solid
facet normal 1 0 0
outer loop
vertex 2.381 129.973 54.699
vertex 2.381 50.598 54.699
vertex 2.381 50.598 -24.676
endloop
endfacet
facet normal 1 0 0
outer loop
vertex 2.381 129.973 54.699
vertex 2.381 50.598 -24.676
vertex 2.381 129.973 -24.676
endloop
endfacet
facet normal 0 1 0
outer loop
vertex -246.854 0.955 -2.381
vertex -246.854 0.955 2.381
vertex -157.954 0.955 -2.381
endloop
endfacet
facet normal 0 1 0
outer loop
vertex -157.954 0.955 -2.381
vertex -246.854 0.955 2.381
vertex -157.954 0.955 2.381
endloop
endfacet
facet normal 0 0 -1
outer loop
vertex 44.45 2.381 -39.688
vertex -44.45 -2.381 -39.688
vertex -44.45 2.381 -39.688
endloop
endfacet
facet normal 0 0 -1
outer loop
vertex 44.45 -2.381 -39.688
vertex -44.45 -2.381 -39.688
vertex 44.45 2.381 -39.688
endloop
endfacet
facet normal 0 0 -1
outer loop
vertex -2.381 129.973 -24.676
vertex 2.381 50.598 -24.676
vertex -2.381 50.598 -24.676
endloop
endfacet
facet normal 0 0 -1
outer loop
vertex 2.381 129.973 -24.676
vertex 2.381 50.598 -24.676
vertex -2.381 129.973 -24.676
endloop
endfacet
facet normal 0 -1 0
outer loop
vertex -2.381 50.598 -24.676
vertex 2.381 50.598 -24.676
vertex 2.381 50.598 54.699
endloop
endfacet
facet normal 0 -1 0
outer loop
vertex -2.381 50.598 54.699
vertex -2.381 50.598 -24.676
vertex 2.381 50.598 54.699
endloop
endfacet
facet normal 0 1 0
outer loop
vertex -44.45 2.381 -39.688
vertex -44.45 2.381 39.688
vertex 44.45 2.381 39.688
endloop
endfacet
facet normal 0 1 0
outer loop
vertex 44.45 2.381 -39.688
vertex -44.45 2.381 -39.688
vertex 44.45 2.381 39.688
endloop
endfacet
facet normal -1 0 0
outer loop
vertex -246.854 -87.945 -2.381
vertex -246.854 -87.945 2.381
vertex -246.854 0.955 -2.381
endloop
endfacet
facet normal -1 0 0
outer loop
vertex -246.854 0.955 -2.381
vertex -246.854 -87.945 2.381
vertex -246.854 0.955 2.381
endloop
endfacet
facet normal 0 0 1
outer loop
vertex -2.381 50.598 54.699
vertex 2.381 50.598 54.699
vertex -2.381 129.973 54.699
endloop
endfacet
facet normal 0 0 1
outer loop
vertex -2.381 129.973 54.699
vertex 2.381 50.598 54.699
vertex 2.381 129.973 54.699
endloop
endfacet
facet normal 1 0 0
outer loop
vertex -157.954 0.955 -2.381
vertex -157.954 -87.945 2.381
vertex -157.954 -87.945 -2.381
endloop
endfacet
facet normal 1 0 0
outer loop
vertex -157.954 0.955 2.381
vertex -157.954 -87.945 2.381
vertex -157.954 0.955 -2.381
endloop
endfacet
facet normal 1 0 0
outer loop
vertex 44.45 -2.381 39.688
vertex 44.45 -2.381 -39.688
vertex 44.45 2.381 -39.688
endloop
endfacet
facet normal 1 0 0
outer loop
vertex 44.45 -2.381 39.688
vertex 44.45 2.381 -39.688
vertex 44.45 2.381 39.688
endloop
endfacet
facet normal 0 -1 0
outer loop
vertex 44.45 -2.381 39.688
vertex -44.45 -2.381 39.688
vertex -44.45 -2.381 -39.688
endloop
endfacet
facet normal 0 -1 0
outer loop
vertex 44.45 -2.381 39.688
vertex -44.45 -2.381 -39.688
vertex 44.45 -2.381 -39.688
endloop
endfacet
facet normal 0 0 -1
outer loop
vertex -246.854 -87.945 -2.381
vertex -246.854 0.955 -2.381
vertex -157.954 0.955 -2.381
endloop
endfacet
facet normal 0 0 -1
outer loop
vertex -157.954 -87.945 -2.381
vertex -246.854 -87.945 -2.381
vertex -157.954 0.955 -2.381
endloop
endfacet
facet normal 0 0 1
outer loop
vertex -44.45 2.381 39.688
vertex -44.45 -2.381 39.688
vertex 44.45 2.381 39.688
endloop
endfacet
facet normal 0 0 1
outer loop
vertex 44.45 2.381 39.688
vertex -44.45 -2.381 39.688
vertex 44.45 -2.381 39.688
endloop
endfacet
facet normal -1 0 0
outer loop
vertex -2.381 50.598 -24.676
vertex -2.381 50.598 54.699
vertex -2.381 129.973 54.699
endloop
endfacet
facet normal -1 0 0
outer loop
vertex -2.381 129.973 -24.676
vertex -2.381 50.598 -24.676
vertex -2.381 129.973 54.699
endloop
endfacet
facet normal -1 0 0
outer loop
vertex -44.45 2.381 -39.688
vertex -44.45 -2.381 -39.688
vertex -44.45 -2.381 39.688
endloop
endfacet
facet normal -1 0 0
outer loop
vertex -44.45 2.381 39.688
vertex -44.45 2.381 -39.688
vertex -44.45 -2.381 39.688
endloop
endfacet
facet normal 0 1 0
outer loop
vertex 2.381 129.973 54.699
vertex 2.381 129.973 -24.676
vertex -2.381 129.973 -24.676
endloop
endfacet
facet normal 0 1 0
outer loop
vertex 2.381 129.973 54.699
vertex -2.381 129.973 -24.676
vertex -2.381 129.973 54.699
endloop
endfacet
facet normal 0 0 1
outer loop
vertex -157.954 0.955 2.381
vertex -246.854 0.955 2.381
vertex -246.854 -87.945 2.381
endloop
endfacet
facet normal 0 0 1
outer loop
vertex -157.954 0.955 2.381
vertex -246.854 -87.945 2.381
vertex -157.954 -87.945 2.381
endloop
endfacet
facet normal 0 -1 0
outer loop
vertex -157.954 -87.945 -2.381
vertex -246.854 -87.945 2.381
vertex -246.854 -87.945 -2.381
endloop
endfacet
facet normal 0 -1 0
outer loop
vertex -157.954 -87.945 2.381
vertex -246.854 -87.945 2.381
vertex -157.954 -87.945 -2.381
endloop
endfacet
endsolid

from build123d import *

# Parameters (mm, degrees)
F1_W     = 88.9
F1_H     = 79.375
F2_DEPTH = 2.38125
F3_W     = 79.375
F3_H     = 79.375
F4_DEPTH = 2.38125
F5_W     = 88.9
F5_H     = 88.9
F6_DEPTH = 2.38125


# Not quite as in the source:
# - a variable given as a bare number and used for a length is read in inches; the dataset says mm whatever the document's units were


with BuildPart() as f2:
    # F1 (on Front) → F2 (new body, symmetric)
    with BuildSketch(Plane.XZ):
        Rectangle(F1_W, F1_H)
    extrude(amount=F2_DEPTH, both=True)


with BuildPart() as f4:
    # F3 (on Right) → F4 (new body, symmetric)
    with BuildSketch(Plane.YZ):
        with Locations((90.2850845814, 15.0111026208)):
            Rectangle(F3_W, F3_H)
    extrude(amount=F4_DEPTH, both=True)


with BuildPart() as f6:
    # F5 (on Top) → F6 (new body, symmetric)
    with BuildSketch(Plane.XY):
        with Locations((-202.4036215127, -43.4954859122)):
            Rectangle(F5_W, F5_H)
    extrude(amount=F6_DEPTH, both=True)


solid = Compound([f2.part, f4.part, f6.part])
